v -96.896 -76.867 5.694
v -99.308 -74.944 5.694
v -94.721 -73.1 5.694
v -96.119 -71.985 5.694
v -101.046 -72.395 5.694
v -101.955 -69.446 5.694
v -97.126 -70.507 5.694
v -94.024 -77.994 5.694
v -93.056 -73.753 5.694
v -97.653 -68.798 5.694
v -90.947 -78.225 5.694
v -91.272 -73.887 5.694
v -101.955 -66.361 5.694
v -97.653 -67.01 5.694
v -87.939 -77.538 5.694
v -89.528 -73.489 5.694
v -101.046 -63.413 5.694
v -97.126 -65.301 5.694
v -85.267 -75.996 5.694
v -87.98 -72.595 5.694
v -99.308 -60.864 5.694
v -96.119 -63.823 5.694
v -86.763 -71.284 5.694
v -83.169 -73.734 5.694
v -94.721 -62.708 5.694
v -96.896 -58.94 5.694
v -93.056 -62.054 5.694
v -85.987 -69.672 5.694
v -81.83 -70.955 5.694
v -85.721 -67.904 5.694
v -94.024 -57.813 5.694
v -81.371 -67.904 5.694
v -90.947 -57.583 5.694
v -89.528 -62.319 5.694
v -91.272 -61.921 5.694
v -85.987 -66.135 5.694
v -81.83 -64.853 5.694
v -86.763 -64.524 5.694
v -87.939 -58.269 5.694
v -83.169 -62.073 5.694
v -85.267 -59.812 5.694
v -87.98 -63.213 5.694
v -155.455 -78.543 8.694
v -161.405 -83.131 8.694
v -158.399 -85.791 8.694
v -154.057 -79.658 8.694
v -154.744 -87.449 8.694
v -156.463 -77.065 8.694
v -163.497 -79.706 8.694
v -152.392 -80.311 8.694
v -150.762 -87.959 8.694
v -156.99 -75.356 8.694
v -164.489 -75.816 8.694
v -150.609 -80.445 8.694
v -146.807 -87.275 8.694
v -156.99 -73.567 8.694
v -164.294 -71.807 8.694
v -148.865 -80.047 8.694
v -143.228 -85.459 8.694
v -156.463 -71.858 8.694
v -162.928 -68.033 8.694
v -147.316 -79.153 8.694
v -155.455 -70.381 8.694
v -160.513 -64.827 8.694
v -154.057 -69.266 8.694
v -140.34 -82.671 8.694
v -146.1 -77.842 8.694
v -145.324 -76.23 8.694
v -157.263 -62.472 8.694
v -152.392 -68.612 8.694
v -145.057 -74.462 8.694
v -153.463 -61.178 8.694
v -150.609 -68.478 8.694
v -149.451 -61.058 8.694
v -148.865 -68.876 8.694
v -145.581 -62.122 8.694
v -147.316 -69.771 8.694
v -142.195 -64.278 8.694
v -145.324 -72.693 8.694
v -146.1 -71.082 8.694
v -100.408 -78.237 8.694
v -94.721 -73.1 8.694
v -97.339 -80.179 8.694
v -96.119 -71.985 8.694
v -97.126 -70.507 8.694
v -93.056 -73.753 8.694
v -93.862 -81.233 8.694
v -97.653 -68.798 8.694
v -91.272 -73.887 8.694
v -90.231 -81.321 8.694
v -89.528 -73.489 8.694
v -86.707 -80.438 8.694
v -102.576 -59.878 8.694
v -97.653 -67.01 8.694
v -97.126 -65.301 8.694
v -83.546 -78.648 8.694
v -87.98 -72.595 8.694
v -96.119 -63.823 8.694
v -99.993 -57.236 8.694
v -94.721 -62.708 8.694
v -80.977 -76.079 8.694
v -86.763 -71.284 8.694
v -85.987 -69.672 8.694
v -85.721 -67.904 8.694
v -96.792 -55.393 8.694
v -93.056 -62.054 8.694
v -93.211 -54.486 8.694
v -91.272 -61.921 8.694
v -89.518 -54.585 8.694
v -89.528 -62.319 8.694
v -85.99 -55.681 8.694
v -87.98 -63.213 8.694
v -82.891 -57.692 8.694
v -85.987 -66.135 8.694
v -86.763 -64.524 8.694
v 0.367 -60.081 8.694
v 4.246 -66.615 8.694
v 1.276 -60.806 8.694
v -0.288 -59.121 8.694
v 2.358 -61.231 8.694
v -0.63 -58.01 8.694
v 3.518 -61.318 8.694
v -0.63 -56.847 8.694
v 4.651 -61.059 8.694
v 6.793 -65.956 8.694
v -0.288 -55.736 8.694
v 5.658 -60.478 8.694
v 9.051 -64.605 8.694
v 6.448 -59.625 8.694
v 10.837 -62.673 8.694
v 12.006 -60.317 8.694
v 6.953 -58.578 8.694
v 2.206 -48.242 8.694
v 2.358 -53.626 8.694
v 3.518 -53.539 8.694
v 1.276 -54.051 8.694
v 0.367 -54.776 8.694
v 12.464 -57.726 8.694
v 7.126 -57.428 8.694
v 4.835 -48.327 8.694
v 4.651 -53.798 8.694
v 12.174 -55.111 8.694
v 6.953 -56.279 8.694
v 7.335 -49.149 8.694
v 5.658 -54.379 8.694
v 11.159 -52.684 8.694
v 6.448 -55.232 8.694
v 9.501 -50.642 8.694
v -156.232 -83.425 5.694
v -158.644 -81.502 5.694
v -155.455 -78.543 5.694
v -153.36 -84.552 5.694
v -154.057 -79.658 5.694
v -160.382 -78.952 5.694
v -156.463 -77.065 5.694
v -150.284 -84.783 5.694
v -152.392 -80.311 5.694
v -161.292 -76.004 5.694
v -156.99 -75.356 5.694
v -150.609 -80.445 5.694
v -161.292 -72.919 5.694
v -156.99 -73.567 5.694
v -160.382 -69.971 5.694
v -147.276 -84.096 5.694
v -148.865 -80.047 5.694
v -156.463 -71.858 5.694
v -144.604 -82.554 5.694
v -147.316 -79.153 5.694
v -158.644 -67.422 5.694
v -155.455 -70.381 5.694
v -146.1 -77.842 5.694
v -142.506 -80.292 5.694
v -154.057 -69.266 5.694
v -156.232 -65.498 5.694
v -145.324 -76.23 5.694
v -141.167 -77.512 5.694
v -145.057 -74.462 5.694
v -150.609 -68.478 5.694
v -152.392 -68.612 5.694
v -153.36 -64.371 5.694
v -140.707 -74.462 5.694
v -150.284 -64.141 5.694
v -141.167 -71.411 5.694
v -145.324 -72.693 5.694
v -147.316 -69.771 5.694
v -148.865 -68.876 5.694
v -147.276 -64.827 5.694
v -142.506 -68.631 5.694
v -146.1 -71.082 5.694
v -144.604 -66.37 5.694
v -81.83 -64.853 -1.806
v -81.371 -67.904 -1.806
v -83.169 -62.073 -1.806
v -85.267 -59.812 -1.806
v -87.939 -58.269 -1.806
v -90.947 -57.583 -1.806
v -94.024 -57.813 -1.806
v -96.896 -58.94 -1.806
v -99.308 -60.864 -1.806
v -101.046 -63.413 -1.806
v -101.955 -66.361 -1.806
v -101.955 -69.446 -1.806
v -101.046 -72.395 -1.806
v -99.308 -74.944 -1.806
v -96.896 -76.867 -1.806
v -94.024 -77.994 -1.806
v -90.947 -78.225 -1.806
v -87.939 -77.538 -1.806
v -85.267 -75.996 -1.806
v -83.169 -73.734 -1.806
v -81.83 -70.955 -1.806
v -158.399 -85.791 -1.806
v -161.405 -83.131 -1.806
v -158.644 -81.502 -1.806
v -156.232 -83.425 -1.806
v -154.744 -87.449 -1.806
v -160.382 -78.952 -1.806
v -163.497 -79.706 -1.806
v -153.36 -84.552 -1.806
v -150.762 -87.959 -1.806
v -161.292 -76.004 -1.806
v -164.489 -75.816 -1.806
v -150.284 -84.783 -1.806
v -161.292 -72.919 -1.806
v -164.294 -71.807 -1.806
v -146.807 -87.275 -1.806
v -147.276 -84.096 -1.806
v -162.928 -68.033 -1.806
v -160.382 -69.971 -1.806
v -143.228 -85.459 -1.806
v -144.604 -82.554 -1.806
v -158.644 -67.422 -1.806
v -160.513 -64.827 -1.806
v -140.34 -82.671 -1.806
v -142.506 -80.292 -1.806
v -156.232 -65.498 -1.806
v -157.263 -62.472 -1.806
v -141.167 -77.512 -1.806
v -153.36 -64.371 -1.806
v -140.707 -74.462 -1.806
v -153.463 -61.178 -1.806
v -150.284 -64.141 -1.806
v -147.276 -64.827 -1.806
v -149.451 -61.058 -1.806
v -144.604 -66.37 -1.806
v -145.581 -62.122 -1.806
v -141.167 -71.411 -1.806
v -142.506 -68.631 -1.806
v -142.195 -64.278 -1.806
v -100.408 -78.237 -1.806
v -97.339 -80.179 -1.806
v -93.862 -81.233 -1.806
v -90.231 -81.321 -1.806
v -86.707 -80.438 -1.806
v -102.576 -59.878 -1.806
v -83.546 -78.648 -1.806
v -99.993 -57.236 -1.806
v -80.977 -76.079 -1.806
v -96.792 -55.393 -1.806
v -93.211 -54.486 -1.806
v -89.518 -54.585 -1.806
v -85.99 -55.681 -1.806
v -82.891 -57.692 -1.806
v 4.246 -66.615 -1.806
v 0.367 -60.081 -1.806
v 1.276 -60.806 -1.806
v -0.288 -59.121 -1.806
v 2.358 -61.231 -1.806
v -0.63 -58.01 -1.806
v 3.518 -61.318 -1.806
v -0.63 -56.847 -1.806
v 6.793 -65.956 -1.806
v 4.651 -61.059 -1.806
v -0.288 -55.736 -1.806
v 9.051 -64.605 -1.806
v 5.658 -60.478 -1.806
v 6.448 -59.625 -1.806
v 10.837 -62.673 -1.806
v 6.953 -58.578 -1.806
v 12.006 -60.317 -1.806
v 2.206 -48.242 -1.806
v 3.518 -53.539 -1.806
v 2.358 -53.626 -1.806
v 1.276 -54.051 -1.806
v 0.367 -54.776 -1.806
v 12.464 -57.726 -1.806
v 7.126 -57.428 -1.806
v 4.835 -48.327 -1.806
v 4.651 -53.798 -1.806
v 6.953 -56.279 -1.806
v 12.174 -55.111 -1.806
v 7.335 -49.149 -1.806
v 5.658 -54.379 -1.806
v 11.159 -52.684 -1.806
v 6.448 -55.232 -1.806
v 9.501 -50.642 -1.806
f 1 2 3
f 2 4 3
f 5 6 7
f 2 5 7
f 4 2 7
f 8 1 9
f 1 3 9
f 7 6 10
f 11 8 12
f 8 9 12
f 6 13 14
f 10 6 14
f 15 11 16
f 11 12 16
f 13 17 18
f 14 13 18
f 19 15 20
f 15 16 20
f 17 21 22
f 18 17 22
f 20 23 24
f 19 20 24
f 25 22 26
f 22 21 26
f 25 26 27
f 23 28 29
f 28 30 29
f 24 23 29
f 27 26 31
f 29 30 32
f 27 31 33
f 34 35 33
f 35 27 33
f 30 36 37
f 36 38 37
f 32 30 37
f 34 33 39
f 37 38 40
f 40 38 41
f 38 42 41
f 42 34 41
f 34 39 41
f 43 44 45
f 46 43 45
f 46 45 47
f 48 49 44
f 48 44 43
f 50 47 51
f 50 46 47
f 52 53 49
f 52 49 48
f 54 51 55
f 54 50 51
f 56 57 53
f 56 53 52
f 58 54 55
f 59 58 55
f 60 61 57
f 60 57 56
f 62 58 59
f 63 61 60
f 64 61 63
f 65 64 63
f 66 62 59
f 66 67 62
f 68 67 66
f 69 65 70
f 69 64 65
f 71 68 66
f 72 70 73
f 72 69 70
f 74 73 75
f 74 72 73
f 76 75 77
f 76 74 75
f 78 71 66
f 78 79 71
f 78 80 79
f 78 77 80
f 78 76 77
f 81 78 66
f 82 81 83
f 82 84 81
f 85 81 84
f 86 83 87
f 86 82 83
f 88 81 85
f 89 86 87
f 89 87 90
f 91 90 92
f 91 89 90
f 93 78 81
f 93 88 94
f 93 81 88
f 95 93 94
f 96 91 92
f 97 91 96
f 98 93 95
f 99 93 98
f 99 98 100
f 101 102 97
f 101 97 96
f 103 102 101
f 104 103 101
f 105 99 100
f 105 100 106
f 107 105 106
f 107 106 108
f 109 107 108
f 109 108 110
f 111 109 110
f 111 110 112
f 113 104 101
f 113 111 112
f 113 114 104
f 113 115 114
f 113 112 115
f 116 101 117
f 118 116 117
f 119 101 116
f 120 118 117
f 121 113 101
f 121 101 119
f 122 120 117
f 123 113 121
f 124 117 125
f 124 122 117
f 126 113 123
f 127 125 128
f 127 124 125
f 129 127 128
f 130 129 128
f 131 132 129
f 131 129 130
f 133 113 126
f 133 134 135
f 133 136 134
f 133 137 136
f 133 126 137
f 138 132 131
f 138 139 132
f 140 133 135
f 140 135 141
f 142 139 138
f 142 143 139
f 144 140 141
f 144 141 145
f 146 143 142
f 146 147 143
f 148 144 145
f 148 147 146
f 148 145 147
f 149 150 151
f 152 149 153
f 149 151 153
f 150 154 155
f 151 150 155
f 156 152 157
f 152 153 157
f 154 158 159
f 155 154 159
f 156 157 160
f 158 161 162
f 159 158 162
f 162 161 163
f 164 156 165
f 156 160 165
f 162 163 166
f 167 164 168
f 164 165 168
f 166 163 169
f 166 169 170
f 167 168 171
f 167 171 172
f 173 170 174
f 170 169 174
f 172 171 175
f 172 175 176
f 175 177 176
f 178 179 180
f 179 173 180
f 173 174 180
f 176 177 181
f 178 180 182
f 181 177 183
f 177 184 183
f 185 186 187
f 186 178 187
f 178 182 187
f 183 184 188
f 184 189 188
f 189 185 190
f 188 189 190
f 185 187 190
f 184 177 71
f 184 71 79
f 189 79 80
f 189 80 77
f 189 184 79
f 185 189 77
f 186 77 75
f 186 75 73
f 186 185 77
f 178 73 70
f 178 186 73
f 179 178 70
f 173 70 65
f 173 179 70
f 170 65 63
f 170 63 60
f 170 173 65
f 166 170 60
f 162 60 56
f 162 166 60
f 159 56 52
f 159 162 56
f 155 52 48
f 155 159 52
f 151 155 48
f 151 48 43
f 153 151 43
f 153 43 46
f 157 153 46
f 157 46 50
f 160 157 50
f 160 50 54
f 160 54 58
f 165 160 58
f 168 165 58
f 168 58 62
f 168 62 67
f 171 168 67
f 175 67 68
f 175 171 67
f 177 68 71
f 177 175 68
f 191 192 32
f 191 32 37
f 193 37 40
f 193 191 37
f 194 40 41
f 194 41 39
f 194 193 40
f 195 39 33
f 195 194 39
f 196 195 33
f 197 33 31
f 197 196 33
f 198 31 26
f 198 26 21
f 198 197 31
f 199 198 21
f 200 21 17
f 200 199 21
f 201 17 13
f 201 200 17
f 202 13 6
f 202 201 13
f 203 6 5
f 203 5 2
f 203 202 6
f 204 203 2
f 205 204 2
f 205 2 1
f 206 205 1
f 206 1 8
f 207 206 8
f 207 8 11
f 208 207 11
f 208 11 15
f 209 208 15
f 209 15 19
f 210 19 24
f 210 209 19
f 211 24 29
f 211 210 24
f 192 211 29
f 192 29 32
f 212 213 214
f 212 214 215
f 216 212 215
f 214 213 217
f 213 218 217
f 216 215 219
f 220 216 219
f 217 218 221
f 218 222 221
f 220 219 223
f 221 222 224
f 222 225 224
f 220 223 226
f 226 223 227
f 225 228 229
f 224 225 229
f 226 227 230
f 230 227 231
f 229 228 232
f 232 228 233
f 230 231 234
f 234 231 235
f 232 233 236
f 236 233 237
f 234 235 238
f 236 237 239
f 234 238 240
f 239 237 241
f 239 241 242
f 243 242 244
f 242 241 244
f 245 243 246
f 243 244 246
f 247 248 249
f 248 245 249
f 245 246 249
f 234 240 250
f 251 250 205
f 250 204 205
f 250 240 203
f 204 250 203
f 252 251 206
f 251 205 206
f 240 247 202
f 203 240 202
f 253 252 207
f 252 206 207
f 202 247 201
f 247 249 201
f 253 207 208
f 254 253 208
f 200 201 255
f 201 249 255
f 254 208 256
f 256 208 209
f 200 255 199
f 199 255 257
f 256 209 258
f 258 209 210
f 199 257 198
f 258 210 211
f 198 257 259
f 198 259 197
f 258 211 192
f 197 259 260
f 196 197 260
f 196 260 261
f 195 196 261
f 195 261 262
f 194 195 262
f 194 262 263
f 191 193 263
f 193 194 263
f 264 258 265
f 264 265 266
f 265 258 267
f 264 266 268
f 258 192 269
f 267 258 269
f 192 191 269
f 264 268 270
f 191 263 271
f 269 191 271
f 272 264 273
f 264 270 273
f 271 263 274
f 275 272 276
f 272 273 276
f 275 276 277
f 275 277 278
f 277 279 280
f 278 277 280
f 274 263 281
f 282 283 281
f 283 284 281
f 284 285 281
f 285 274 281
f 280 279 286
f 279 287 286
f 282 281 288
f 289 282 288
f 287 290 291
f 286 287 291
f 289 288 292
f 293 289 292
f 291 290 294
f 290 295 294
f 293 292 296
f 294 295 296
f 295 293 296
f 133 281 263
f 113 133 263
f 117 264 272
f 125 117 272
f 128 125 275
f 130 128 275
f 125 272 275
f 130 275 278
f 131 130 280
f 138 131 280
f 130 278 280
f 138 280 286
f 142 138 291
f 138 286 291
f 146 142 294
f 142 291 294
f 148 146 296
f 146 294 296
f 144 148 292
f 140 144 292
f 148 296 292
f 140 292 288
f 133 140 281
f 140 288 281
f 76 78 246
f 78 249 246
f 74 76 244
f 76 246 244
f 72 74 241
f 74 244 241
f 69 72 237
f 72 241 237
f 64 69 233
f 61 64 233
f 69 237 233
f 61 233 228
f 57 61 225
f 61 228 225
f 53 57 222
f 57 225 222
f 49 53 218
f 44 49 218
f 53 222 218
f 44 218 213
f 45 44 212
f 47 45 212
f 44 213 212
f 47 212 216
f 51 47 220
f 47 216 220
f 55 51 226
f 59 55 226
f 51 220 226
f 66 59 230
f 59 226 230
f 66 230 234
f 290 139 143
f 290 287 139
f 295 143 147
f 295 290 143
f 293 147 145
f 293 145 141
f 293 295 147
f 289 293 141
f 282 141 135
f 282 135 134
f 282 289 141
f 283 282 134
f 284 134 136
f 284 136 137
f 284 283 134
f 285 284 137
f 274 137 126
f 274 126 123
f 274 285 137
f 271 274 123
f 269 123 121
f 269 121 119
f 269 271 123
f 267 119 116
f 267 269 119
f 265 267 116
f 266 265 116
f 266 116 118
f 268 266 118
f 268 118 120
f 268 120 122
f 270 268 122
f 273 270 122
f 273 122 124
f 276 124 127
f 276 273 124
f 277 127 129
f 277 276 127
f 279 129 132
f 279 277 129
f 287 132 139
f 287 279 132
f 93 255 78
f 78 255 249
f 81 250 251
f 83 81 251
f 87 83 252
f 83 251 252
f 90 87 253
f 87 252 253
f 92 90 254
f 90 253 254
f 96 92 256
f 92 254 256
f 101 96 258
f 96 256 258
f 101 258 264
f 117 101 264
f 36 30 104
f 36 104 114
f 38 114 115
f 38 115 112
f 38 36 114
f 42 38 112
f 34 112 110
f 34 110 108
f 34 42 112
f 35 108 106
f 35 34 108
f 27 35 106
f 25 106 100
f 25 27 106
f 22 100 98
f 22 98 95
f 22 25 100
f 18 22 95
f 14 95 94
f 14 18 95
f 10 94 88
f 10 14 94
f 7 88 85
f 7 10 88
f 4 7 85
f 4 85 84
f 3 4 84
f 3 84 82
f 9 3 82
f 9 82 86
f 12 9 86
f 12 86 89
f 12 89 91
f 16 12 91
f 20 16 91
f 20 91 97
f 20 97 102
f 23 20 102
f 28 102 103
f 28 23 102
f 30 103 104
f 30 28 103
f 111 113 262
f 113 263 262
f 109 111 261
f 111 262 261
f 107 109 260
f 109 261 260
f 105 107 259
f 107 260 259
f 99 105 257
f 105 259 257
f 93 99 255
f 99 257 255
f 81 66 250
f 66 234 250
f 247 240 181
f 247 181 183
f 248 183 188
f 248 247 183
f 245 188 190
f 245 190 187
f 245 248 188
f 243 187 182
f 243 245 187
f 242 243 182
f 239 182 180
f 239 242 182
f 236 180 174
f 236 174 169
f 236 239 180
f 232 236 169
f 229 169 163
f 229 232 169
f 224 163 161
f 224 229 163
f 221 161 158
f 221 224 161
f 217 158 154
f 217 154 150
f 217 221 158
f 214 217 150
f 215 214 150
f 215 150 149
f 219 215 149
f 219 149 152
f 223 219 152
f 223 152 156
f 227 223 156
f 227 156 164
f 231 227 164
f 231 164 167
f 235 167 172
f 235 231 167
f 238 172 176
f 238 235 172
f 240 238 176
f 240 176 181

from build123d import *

# Parameters (mm, degrees)
SKETCH1_R           = 2.6
SKETCH1_R_2         = 6.9
BOSS_EXTRUDE1_DEPTH = 5
SKETCH2_R           = 2.6
SKETCH2_R_2         = 4
BOSS_EXTRUDE2_DEPTH = 2
SCALE1_SCALE        = 1.5


with BuildPart() as part:
    # Sketch1 → Boss-Extrude1 (new body)
    with BuildSketch(Plane.XY):
        with BuildLine():
            Line((-117.842377899, -77.068349263), (-91.221161774, -74.112086796))
            ThreePointArc((-91.221161774, -74.112086796), (-84.435913767, -76.1684327), (-78.267124508, -72.673552434))
            Line((-78.267124508, -72.673552434), (-21.451382857, -66.364214657))
            ThreePointArc((-21.451382857, -66.364214657), (-16.007105356, -59.559722092), (-22.811597922, -54.115444591))
            Line((-22.811597922, -54.115444591), (-79.542760834, -60.415389973))
            ThreePointArc((-79.542760834, -60.415389973), (-86.42258563, -58.278403776), (-92.665955577, -61.872709124))
            Line((-92.665955577, -61.872709124), (-119.079141177, -64.805869985))
            ThreePointArc((-119.079141177, -64.805869985), (-133.941604274, -72.498469269), (-117.842377899, -77.068349263))
        make_face()
        with Locations((-22.131490389, -60.239829624)):
            Circle(SKETCH1_R, mode=Mode.SUBTRACT)
        with Locations((-85.429249698, -67.223418238)):
            Circle(SKETCH1_R_2, mode=Mode.SUBTRACT)
        with Locations((-124.987033061, -71.595333402)):
            Circle(SKETCH1_R_2, mode=Mode.SUBTRACT)
    extrude(amount=BOSS_EXTRUDE1_DEPTH)

    # Sketch2 → Boss-Extrude2 (add)
    with BuildSketch(Plane.XY.offset(5)):
        with BuildLine():
            Line((-22.811597922, -54.115444591), (-79.542760834, -60.415389973))
            ThreePointArc((-79.542760834, -60.415389973), (-86.42258563, -58.278403776), (-92.665955577, -61.872709124))
            Line((-92.665955577, -61.872709124), (-119.079141177, -64.805869985))
            ThreePointArc((-119.079141177, -64.805869985), (-133.941604274, -72.498469269), (-117.842377899, -77.068349263))
            Line((-117.842377899, -77.068349263), (-91.221161774, -74.112086796))
            ThreePointArc((-91.221161774, -74.112086796), (-84.435913767, -76.1684327), (-78.267124508, -72.673552434))
            Line((-78.267124508, -72.673552434), (-21.451382857, -66.364214657))
            ThreePointArc((-21.451382857, -66.364214657), (-16.007105356, -59.559722092), (-22.811597922, -54.115444591))
        make_face()
        with Locations((-22.131490389, -60.239829624)):
            Circle(SKETCH2_R, mode=Mode.SUBTRACT)
        with Locations((-85.429249698, -67.223418238)):
            Circle(SKETCH2_R_2, mode=Mode.SUBTRACT)
        with Locations((-124.987033061, -71.595333402)):
            Circle(SKETCH2_R_2, mode=Mode.SUBTRACT)
    extrude(amount=BOSS_EXTRUDE2_DEPTH)


with BuildPart() as part_1:
    # Scale1: scaled about (-72.846730446, -65.862557014, 3.611202843)
    add(part.part.scale(SCALE1_SCALE).moved(Location((36.423365223, 32.931278507, -1.805601422))))


solid = part_1.part
